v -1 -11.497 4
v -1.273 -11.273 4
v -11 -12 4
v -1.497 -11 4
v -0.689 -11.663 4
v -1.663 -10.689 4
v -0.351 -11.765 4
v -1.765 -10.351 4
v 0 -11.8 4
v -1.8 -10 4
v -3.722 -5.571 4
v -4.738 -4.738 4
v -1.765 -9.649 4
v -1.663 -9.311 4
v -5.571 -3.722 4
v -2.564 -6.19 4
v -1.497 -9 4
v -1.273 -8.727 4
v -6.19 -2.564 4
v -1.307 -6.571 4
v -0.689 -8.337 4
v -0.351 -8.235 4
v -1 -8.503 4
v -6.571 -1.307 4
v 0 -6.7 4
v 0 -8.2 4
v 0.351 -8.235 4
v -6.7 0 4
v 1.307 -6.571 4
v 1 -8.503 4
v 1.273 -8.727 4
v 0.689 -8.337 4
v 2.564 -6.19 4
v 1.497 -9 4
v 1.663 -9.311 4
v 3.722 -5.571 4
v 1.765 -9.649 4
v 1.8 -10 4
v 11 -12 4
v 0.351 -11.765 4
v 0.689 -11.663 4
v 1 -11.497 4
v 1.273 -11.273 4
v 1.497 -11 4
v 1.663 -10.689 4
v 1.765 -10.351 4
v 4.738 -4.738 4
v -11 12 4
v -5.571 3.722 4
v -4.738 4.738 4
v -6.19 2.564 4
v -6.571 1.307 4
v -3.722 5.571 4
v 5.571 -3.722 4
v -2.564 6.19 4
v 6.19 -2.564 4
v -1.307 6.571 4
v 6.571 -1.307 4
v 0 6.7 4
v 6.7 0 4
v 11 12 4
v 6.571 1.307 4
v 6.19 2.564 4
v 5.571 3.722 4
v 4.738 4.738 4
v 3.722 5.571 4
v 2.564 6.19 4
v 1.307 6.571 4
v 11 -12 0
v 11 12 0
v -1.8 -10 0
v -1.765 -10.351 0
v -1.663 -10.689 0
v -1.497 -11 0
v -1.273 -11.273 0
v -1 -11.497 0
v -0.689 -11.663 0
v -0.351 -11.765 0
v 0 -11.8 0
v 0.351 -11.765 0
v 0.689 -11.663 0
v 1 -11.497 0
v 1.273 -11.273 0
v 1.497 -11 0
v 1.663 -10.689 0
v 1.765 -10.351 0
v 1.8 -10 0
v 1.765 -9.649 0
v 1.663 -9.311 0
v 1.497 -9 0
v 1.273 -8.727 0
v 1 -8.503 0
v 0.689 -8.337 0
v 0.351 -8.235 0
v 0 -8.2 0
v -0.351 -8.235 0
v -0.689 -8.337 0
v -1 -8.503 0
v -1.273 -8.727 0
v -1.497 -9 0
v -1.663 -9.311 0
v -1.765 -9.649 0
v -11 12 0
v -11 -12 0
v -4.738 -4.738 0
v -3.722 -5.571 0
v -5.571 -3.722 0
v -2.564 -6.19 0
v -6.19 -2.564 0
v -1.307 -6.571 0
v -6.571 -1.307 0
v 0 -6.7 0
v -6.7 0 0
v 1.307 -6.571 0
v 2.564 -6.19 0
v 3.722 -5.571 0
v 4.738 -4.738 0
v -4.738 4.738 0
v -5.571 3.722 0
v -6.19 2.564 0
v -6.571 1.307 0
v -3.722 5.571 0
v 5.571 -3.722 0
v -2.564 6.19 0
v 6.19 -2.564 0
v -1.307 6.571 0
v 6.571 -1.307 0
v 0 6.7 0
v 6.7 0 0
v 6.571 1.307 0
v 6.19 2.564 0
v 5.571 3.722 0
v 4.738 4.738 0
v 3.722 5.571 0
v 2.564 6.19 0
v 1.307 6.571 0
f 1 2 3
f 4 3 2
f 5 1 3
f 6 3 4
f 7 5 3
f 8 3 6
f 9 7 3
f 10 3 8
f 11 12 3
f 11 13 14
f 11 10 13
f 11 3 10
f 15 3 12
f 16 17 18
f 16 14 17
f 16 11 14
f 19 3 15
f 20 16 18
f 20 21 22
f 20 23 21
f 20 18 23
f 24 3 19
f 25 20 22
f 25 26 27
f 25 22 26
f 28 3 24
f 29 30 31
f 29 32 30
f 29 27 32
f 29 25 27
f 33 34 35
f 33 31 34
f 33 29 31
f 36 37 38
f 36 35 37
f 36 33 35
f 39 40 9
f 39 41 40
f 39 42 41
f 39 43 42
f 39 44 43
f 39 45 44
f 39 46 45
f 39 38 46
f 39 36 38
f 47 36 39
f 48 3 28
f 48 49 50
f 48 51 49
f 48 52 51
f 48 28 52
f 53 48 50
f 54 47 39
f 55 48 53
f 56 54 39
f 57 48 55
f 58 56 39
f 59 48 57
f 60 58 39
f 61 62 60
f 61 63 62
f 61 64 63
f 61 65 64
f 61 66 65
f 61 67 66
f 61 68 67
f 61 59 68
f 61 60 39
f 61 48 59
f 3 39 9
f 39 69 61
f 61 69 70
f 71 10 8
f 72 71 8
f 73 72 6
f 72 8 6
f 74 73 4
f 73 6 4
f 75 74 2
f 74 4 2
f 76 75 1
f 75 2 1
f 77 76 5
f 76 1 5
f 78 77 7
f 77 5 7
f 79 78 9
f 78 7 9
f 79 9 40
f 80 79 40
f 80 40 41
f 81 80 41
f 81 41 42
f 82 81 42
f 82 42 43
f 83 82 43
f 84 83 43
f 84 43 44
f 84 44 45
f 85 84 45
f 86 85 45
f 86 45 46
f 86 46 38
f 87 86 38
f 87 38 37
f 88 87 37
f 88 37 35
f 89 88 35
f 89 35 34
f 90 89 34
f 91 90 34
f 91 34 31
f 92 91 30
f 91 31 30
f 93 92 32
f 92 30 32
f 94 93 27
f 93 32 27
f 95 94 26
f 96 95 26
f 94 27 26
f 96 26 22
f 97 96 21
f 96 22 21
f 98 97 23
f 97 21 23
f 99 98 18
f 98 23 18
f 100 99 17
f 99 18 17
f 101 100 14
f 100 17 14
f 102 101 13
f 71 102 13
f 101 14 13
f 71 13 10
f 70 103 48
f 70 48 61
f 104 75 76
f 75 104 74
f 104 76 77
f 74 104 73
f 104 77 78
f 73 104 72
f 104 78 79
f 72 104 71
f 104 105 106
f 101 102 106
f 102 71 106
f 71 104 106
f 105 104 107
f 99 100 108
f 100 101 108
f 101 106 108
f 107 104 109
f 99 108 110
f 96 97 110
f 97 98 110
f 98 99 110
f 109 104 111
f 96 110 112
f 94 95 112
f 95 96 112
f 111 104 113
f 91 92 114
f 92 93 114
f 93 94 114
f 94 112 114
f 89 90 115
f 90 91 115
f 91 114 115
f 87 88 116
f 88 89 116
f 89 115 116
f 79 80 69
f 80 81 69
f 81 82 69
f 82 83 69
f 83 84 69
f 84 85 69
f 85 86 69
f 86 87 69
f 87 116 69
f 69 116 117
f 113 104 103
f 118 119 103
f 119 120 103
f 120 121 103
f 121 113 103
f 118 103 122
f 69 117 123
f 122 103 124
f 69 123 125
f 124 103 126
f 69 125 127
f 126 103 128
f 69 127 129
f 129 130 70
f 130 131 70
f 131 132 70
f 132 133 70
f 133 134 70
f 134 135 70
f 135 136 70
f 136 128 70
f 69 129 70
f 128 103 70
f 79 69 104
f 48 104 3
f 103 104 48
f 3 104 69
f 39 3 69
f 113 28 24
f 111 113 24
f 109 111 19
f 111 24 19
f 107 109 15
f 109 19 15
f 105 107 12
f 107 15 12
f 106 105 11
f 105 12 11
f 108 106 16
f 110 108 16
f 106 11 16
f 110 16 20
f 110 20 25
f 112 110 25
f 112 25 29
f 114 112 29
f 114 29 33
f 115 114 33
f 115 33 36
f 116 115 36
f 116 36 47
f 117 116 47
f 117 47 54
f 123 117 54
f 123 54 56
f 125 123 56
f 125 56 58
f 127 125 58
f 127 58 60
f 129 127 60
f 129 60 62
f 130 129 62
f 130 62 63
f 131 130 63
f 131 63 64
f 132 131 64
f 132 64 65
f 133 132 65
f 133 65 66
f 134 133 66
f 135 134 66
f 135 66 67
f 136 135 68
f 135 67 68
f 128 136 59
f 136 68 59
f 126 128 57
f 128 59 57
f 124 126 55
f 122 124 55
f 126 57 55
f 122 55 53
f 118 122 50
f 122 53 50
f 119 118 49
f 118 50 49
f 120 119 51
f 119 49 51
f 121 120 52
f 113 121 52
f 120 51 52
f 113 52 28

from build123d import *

# Parameters (mm, degrees)
F0_W     = 22
F0_H     = 24
F3_DEPTH = 4
F4_D     = 13.4
F5_D     = 3.6


with BuildPart() as f3:
    # F0 (on Top) → F3 (new body)
    with BuildSketch(Plane.XY):
        Rectangle(F0_W, F0_H)
    extrude(amount=F3_DEPTH)

    # F4 (through all)
    with Locations(Plane(origin=(0, 0, 0), x_dir=(1, 0, 0), z_dir=(0, 0, -1))):
        with Locations((0, 0)):
            Hole(F4_D / 2)

    # F5 (through all)
    with Locations(Plane(origin=(0, 0, 0), x_dir=(1, 0, 0), z_dir=(0, 0, -1))):
        with Locations((0, 10)):
            Hole(F5_D / 2)


solid = f3.part
